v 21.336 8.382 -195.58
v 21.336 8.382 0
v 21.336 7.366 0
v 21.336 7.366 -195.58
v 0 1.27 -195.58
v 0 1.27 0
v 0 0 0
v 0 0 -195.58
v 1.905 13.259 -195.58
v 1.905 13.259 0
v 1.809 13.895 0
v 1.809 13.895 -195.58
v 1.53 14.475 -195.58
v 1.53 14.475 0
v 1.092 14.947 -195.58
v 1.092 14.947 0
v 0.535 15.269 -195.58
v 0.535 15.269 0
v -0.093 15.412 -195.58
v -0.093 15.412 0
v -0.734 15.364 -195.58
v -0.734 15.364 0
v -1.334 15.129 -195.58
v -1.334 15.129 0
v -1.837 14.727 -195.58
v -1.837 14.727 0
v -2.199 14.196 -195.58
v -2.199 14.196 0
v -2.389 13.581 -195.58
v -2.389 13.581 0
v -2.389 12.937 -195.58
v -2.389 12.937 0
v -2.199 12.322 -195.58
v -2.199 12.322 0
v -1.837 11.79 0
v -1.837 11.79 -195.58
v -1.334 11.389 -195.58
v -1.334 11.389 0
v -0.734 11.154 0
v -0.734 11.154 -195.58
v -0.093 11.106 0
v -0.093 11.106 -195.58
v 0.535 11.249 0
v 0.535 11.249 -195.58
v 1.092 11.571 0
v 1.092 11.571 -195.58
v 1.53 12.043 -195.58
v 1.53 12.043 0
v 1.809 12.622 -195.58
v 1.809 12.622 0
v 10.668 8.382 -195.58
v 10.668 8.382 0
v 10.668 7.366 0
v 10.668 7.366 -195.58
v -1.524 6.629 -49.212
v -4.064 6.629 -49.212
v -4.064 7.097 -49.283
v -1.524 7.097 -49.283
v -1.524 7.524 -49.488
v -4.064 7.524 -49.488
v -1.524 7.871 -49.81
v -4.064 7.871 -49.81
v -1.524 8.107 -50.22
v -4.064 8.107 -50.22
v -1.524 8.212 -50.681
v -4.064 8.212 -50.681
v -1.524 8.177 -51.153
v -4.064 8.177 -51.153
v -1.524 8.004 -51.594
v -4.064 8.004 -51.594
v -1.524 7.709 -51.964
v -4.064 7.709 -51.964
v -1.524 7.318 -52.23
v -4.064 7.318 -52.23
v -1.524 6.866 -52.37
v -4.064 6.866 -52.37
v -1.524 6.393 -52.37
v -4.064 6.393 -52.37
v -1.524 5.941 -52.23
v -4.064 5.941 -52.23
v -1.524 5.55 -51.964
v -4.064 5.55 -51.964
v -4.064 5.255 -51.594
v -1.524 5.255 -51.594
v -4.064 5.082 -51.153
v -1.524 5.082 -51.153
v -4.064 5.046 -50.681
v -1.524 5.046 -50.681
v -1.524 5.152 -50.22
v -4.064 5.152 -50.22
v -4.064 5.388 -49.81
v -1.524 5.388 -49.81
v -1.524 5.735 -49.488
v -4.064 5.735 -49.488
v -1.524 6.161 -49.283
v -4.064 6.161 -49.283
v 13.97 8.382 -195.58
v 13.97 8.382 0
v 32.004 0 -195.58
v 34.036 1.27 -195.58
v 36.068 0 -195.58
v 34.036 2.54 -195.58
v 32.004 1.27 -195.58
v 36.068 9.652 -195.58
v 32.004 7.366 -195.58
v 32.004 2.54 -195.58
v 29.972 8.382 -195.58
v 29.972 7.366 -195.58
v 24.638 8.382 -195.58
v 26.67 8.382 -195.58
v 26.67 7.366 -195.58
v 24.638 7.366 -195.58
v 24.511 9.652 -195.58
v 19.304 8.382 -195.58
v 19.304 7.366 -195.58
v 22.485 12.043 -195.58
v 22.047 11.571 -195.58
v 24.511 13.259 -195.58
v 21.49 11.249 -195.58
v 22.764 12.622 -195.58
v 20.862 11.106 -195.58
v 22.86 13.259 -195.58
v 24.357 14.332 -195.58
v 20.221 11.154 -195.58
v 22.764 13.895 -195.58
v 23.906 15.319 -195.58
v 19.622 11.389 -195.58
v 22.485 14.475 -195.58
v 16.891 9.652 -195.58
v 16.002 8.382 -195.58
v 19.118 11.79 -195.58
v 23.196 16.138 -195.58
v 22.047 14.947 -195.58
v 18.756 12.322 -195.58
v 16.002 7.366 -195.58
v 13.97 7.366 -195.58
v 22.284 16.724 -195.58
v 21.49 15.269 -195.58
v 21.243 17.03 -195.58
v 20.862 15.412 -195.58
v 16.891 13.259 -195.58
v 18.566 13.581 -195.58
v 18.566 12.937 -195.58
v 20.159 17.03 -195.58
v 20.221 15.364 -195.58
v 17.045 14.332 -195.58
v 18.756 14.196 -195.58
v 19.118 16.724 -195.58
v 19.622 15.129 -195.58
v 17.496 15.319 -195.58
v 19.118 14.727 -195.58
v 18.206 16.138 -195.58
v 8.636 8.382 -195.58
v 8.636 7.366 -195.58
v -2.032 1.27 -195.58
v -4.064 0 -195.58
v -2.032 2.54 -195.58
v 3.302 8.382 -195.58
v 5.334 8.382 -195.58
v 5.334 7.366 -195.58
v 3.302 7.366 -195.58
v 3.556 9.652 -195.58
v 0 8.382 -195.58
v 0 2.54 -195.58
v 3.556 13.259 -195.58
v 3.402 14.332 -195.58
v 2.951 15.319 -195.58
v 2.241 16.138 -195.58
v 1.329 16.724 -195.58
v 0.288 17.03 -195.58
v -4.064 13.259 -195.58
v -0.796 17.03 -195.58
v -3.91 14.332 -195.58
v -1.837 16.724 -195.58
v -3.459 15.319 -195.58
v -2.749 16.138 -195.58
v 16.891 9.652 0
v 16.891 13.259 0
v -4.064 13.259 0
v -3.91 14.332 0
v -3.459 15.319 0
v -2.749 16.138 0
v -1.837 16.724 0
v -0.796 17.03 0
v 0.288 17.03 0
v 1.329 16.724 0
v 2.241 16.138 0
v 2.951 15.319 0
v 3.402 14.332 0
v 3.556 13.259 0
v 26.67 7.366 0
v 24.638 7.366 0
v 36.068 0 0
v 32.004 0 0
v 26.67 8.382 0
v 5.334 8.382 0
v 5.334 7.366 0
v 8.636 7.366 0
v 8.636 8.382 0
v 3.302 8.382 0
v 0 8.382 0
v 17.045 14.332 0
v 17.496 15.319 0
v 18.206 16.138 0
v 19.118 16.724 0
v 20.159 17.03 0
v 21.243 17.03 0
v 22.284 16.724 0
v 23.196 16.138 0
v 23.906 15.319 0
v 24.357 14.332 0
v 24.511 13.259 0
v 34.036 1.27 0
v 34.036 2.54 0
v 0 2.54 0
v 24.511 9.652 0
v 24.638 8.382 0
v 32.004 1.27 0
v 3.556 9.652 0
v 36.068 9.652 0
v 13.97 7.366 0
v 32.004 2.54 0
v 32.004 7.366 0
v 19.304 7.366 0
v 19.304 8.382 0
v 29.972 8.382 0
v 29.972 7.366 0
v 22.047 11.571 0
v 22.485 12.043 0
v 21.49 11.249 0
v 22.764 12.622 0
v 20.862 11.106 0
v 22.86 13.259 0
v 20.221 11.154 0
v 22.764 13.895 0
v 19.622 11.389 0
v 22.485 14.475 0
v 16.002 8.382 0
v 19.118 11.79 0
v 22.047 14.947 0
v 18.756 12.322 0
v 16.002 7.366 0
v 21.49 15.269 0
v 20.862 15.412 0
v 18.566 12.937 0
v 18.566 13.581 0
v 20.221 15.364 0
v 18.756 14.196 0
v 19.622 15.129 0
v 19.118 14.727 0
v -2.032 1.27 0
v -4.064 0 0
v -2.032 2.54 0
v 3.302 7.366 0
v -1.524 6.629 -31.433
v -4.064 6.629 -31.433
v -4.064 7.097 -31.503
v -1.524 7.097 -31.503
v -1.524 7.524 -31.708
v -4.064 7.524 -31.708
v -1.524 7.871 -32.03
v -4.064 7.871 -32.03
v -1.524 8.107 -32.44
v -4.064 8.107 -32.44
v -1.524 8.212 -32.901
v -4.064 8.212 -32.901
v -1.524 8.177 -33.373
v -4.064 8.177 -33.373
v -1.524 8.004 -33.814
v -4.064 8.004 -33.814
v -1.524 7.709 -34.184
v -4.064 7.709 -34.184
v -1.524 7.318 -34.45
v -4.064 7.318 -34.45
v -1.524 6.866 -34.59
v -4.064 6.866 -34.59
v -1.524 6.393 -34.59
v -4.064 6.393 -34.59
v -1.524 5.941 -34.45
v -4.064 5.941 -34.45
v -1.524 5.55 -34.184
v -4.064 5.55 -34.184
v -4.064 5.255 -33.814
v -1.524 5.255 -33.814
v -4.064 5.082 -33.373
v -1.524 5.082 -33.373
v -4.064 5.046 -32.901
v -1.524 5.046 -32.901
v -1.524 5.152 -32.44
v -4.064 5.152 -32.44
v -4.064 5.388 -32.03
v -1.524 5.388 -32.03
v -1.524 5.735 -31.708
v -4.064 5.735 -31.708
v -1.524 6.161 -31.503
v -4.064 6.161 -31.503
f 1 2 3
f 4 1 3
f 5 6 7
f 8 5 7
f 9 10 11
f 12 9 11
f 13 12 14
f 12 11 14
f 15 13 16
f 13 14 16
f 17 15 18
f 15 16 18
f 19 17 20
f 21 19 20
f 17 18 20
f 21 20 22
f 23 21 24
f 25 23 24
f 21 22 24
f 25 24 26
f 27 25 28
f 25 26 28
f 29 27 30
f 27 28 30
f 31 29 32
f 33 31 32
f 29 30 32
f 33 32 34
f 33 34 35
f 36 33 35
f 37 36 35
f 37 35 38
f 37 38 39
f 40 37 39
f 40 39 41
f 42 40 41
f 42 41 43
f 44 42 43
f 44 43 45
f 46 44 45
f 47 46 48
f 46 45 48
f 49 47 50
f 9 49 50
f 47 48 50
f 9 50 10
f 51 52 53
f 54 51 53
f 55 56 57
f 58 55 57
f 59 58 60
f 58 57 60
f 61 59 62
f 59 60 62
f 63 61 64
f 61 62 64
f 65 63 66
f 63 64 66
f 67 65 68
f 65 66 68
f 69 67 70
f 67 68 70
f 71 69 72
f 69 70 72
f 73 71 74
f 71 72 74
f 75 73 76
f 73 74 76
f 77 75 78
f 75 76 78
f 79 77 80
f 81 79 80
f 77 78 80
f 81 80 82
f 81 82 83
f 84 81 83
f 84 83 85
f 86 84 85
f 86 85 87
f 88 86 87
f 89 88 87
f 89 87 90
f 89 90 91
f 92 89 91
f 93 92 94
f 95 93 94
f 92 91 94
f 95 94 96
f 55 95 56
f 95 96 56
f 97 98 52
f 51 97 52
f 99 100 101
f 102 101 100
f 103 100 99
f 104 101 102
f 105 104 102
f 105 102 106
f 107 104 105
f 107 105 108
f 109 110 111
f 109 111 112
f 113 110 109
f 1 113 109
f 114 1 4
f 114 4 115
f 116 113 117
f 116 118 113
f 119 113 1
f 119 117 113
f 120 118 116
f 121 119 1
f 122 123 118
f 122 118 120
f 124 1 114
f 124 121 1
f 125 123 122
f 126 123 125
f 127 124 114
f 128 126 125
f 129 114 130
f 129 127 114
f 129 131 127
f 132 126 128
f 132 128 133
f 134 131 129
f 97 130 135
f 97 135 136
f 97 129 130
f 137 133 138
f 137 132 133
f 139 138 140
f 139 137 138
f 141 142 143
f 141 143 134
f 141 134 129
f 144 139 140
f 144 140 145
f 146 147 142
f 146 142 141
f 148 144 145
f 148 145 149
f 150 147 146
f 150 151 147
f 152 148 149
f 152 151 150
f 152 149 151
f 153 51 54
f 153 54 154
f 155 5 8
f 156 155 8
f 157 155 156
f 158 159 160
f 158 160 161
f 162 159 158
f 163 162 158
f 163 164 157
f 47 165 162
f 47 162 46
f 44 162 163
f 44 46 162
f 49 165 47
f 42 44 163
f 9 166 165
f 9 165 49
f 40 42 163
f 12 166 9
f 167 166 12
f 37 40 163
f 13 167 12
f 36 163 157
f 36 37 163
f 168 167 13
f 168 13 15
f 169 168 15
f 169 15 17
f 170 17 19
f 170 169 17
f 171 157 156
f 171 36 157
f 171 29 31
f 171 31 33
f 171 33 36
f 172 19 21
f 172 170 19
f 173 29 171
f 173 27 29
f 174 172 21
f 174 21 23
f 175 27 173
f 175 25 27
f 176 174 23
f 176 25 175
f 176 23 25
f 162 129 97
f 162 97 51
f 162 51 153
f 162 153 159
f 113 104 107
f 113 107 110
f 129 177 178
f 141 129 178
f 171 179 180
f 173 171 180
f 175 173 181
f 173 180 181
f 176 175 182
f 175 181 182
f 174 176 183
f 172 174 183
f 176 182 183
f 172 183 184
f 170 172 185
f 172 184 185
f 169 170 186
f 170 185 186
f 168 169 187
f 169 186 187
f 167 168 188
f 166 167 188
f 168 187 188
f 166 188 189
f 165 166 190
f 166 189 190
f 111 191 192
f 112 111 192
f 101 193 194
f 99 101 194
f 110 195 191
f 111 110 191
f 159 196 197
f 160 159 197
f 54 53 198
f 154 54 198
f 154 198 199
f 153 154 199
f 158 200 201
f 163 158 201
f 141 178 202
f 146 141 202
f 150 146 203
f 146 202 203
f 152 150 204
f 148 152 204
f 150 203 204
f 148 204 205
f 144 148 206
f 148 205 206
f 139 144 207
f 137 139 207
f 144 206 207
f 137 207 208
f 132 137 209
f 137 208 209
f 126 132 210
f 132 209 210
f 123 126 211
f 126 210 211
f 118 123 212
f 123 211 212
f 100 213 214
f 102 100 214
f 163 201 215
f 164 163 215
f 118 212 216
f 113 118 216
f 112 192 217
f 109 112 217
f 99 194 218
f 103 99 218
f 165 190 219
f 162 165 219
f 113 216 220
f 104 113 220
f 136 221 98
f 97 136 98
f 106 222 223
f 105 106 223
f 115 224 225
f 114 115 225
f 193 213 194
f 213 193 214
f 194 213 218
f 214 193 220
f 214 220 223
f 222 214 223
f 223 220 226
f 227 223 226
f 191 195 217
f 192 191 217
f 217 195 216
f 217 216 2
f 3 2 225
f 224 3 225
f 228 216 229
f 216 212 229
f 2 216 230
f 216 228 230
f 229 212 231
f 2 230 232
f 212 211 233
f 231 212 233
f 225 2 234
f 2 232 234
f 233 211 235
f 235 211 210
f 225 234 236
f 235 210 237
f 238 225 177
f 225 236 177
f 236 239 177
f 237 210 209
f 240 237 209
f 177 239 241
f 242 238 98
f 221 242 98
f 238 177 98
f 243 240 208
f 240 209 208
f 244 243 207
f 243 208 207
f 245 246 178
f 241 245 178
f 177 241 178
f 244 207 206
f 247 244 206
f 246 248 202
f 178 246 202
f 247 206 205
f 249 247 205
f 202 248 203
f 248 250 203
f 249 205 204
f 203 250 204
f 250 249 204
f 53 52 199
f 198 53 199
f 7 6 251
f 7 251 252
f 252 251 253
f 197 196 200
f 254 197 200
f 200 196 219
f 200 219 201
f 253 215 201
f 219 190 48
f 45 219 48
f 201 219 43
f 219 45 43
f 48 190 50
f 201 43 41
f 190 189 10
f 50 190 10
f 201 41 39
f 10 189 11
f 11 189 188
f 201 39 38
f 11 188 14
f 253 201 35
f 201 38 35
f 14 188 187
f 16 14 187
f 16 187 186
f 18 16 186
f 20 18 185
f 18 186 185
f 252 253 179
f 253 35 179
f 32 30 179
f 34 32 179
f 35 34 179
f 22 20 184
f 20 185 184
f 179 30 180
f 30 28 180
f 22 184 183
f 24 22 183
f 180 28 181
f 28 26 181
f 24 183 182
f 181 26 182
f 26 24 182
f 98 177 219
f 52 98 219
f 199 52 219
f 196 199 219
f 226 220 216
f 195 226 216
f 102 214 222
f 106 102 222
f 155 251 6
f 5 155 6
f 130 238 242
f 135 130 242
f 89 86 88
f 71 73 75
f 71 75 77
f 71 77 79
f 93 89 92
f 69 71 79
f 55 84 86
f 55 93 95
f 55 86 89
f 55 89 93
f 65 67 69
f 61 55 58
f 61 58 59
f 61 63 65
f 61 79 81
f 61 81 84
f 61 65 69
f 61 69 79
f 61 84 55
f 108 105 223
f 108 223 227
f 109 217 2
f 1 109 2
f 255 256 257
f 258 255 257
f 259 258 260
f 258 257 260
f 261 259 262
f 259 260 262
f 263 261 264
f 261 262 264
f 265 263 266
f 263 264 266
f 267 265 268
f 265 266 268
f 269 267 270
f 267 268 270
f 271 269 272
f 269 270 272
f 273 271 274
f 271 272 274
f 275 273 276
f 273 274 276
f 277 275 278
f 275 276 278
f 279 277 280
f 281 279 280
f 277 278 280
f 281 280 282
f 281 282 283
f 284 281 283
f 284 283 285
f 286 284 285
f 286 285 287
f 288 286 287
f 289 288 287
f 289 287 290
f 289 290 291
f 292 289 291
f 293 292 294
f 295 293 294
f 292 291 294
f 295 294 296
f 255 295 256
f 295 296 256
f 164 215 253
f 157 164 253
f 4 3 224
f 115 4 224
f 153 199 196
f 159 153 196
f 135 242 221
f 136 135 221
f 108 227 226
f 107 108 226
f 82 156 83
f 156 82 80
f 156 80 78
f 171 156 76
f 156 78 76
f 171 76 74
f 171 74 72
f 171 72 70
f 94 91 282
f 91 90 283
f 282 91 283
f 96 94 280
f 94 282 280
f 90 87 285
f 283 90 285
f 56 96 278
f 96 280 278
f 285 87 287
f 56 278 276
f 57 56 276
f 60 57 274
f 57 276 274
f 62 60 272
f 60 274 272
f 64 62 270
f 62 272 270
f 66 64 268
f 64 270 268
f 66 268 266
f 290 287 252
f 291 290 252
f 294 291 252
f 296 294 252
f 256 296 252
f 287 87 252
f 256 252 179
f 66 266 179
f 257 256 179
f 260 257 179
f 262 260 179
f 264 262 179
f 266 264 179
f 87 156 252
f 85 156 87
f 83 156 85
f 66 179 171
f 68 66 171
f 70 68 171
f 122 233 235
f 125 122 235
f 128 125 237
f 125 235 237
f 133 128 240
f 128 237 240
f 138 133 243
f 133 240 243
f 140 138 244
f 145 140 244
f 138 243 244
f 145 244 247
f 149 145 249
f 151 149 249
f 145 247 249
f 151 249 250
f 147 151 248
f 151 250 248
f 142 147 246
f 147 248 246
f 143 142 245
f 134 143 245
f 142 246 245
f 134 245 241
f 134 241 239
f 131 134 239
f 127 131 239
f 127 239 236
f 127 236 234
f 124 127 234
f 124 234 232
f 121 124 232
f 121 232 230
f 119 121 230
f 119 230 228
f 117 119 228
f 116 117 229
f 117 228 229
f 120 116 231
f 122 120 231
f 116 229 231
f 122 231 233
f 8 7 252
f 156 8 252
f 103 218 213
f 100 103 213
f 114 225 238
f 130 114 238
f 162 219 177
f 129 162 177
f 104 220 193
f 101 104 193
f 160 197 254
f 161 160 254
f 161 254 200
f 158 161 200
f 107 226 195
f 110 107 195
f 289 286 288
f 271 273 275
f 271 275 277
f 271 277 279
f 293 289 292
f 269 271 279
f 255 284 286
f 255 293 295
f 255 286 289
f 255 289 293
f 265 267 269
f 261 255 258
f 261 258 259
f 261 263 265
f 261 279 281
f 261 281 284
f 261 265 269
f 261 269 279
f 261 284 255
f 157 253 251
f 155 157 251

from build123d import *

# Parameters (mm, degrees)
SKETCH1_R           = 2.159
BOSS_EXTRUDE1_DEPTH = 195.58
SKETCH2_R           = 1.5875
CUT_EXTRUDE1_DEPTH  = 2.54


with BuildPart() as part:
    # Sketch1 → Boss-Extrude1 (new body)
    with BuildSketch(Plane.XY):
        with BuildLine():
            Line((0, 0), (-4.064, 0))
            Line((-4.064, 0), (-4.064, 9.652))
            Line((-4.064, 9.652), (-4.064, 13.2588))
            ThreePointArc((-4.064, 13.2588), (-0.254, 17.0688), (3.556, 13.2588))
            Line((3.556, 13.2588), (3.556, 9.652))
            Line((3.556, 9.652), (16.891, 9.652))
            Line((16.891, 9.652), (16.891, 13.2588))
            ThreePointArc((16.891, 13.2588), (20.701, 17.0688), (24.511, 13.2588))
            Line((24.511, 13.2588), (24.511, 9.652))
            Line((24.511, 9.652), (36.068, 9.652))
            Line((36.068, 9.652), (36.068, 0))
            Line((36.068, 0), (32.004, 0))
            Line((32.004, 0), (32.004, 1.27))
            Line((32.004, 1.27), (34.036, 1.27))
            Line((34.036, 1.27), (34.036, 2.54))
            Line((34.036, 2.54), (32.004, 2.54))
            Line((32.004, 2.54), (32.004, 7.366))
            Line((32.004, 7.366), (29.972, 7.366))
            Line((29.972, 7.366), (29.972, 8.382))
            Line((29.972, 8.382), (26.67, 8.382))
            Line((26.67, 8.382), (26.67, 7.366))
            Line((26.67, 7.366), (24.638, 7.366))
            Line((24.638, 7.366), (24.638, 8.382))
            Line((24.638, 8.382), (21.336, 8.382))
            Line((21.336, 8.382), (21.336, 7.366))
            Line((21.336, 7.366), (19.304, 7.366))
            Line((19.304, 7.366), (19.304, 8.382))
            Line((19.304, 8.382), (16.002, 8.382))
            Line((16.002, 8.382), (16.002, 7.366))
            Line((16.002, 7.366), (13.97, 7.366))
            Line((13.97, 7.366), (13.97, 8.382))
            Line((13.97, 8.382), (10.668, 8.382))
            Line((10.668, 8.382), (10.668, 7.366))
            Line((10.668, 7.366), (8.636, 7.366))
            Line((8.636, 7.366), (8.636, 8.382))
            Line((8.636, 8.382), (5.334, 8.382))
            Line((5.334, 8.382), (5.334, 7.366))
            Line((5.334, 7.366), (3.302, 7.366))
            Line((3.302, 7.366), (3.302, 8.382))
            Line((3.302, 8.382), (0, 8.382))
            Line((0, 8.382), (0, 2.54))
            Line((0, 2.54), (-2.032, 2.54))
            Line((-2.032, 2.54), (-2.032, 1.27))
            Line((-2.032, 1.27), (0, 1.27))
            Line((0, 1.27), (0, 0))
        make_face()
        with Locations((-0.254, 13.2588)):
            Circle(SKETCH1_R, mode=Mode.SUBTRACT)
        with Locations((20.701, 13.2588)):
            Circle(SKETCH1_R, mode=Mode.SUBTRACT)
    extrude(amount=-BOSS_EXTRUDE1_DEPTH)

    # Sketch2 → Cut-Extrude1 (cut)
    with BuildSketch(Plane.ZY.offset(4.064)):
        with Locations((-33.02, 6.6294)):
            Circle(SKETCH2_R)
        with Locations((-50.8, 6.6294)):
            Circle(SKETCH2_R)
    extrude(amount=-CUT_EXTRUDE1_DEPTH, mode=Mode.SUBTRACT)


solid = part.part
